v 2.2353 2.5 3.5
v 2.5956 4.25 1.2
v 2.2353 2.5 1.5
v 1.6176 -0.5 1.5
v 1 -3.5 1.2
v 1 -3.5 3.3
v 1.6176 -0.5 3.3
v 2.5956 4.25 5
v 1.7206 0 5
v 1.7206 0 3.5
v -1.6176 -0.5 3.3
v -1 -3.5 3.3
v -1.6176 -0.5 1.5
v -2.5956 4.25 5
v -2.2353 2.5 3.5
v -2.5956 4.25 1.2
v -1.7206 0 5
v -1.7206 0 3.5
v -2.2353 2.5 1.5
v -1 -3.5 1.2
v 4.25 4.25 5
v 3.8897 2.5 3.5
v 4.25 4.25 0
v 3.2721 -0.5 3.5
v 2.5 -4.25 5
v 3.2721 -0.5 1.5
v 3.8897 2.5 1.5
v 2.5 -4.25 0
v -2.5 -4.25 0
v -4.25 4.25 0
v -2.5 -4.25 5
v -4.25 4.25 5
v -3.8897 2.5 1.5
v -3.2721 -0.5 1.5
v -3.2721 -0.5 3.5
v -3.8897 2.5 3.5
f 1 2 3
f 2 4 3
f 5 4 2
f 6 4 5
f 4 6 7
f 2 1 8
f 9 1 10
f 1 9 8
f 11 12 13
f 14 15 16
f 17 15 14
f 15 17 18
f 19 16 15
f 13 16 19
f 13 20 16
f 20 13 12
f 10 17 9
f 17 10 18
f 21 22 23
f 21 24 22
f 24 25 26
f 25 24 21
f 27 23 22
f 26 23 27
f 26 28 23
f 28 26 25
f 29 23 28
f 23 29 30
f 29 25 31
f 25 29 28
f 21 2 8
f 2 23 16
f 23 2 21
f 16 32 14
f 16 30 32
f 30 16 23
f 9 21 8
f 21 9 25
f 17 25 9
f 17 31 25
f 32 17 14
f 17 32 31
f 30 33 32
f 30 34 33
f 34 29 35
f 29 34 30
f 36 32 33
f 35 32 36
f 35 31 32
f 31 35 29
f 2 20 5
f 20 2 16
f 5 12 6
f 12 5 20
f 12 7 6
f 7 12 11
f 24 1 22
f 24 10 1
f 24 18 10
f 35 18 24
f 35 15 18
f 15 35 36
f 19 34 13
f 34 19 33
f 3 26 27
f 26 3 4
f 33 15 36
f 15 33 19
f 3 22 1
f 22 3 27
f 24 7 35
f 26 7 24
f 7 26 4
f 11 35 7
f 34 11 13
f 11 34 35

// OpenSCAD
$fa = 1;
$fs = 0.4;
e = 0.001;

module Trapezium(W1, W2, D, H) {
  linear_extrude(height = H) {
    polygon(points = [
      [ W1 / 2, -D / 2 ],
      [ W2 / 2, D / 2 ],
      [ -W2 / 2, D / 2 ],
      [ -W1 / 2, -D / 2 ],
    ]);
  }
}

W1 = 5;
W2 = 8.5;
D = 8.5;
H = 5;
Txy = 1.5;
Tz1 = 1.2;
Tz2 = 1.7;

S1 = 3;
S2 = 2;

difference() {
  Trapezium(W1 = W1, W2 = W2, D = D, H = H);
  translate([ 0, Txy / 2, Tz1 ]) {
    Trapezium(W1 = W1 - 2 * Txy, W2 = W2 - 2 * Txy, D = D, H = H - Tz1 - Tz2);
  }
  translate([ 0, 0, 2 + Tz1 ]) {
    difference() {
      translate([ 0, Txy / 2, 0 ]) {
        Trapezium(W1 = W1 - 2 * Txy, W2 = W2 - 2 * Txy, D = D,
                  H = H - Tz1 - Tz2);
      }
      translate([ -5, -10, -5 ]) { cube(10); }
    }
  }
  translate([ 0, 1, H / 2 ]) {
    cube(
        [
          10,
          S1,
          S2,
        ],
        center = true);
  }
}
